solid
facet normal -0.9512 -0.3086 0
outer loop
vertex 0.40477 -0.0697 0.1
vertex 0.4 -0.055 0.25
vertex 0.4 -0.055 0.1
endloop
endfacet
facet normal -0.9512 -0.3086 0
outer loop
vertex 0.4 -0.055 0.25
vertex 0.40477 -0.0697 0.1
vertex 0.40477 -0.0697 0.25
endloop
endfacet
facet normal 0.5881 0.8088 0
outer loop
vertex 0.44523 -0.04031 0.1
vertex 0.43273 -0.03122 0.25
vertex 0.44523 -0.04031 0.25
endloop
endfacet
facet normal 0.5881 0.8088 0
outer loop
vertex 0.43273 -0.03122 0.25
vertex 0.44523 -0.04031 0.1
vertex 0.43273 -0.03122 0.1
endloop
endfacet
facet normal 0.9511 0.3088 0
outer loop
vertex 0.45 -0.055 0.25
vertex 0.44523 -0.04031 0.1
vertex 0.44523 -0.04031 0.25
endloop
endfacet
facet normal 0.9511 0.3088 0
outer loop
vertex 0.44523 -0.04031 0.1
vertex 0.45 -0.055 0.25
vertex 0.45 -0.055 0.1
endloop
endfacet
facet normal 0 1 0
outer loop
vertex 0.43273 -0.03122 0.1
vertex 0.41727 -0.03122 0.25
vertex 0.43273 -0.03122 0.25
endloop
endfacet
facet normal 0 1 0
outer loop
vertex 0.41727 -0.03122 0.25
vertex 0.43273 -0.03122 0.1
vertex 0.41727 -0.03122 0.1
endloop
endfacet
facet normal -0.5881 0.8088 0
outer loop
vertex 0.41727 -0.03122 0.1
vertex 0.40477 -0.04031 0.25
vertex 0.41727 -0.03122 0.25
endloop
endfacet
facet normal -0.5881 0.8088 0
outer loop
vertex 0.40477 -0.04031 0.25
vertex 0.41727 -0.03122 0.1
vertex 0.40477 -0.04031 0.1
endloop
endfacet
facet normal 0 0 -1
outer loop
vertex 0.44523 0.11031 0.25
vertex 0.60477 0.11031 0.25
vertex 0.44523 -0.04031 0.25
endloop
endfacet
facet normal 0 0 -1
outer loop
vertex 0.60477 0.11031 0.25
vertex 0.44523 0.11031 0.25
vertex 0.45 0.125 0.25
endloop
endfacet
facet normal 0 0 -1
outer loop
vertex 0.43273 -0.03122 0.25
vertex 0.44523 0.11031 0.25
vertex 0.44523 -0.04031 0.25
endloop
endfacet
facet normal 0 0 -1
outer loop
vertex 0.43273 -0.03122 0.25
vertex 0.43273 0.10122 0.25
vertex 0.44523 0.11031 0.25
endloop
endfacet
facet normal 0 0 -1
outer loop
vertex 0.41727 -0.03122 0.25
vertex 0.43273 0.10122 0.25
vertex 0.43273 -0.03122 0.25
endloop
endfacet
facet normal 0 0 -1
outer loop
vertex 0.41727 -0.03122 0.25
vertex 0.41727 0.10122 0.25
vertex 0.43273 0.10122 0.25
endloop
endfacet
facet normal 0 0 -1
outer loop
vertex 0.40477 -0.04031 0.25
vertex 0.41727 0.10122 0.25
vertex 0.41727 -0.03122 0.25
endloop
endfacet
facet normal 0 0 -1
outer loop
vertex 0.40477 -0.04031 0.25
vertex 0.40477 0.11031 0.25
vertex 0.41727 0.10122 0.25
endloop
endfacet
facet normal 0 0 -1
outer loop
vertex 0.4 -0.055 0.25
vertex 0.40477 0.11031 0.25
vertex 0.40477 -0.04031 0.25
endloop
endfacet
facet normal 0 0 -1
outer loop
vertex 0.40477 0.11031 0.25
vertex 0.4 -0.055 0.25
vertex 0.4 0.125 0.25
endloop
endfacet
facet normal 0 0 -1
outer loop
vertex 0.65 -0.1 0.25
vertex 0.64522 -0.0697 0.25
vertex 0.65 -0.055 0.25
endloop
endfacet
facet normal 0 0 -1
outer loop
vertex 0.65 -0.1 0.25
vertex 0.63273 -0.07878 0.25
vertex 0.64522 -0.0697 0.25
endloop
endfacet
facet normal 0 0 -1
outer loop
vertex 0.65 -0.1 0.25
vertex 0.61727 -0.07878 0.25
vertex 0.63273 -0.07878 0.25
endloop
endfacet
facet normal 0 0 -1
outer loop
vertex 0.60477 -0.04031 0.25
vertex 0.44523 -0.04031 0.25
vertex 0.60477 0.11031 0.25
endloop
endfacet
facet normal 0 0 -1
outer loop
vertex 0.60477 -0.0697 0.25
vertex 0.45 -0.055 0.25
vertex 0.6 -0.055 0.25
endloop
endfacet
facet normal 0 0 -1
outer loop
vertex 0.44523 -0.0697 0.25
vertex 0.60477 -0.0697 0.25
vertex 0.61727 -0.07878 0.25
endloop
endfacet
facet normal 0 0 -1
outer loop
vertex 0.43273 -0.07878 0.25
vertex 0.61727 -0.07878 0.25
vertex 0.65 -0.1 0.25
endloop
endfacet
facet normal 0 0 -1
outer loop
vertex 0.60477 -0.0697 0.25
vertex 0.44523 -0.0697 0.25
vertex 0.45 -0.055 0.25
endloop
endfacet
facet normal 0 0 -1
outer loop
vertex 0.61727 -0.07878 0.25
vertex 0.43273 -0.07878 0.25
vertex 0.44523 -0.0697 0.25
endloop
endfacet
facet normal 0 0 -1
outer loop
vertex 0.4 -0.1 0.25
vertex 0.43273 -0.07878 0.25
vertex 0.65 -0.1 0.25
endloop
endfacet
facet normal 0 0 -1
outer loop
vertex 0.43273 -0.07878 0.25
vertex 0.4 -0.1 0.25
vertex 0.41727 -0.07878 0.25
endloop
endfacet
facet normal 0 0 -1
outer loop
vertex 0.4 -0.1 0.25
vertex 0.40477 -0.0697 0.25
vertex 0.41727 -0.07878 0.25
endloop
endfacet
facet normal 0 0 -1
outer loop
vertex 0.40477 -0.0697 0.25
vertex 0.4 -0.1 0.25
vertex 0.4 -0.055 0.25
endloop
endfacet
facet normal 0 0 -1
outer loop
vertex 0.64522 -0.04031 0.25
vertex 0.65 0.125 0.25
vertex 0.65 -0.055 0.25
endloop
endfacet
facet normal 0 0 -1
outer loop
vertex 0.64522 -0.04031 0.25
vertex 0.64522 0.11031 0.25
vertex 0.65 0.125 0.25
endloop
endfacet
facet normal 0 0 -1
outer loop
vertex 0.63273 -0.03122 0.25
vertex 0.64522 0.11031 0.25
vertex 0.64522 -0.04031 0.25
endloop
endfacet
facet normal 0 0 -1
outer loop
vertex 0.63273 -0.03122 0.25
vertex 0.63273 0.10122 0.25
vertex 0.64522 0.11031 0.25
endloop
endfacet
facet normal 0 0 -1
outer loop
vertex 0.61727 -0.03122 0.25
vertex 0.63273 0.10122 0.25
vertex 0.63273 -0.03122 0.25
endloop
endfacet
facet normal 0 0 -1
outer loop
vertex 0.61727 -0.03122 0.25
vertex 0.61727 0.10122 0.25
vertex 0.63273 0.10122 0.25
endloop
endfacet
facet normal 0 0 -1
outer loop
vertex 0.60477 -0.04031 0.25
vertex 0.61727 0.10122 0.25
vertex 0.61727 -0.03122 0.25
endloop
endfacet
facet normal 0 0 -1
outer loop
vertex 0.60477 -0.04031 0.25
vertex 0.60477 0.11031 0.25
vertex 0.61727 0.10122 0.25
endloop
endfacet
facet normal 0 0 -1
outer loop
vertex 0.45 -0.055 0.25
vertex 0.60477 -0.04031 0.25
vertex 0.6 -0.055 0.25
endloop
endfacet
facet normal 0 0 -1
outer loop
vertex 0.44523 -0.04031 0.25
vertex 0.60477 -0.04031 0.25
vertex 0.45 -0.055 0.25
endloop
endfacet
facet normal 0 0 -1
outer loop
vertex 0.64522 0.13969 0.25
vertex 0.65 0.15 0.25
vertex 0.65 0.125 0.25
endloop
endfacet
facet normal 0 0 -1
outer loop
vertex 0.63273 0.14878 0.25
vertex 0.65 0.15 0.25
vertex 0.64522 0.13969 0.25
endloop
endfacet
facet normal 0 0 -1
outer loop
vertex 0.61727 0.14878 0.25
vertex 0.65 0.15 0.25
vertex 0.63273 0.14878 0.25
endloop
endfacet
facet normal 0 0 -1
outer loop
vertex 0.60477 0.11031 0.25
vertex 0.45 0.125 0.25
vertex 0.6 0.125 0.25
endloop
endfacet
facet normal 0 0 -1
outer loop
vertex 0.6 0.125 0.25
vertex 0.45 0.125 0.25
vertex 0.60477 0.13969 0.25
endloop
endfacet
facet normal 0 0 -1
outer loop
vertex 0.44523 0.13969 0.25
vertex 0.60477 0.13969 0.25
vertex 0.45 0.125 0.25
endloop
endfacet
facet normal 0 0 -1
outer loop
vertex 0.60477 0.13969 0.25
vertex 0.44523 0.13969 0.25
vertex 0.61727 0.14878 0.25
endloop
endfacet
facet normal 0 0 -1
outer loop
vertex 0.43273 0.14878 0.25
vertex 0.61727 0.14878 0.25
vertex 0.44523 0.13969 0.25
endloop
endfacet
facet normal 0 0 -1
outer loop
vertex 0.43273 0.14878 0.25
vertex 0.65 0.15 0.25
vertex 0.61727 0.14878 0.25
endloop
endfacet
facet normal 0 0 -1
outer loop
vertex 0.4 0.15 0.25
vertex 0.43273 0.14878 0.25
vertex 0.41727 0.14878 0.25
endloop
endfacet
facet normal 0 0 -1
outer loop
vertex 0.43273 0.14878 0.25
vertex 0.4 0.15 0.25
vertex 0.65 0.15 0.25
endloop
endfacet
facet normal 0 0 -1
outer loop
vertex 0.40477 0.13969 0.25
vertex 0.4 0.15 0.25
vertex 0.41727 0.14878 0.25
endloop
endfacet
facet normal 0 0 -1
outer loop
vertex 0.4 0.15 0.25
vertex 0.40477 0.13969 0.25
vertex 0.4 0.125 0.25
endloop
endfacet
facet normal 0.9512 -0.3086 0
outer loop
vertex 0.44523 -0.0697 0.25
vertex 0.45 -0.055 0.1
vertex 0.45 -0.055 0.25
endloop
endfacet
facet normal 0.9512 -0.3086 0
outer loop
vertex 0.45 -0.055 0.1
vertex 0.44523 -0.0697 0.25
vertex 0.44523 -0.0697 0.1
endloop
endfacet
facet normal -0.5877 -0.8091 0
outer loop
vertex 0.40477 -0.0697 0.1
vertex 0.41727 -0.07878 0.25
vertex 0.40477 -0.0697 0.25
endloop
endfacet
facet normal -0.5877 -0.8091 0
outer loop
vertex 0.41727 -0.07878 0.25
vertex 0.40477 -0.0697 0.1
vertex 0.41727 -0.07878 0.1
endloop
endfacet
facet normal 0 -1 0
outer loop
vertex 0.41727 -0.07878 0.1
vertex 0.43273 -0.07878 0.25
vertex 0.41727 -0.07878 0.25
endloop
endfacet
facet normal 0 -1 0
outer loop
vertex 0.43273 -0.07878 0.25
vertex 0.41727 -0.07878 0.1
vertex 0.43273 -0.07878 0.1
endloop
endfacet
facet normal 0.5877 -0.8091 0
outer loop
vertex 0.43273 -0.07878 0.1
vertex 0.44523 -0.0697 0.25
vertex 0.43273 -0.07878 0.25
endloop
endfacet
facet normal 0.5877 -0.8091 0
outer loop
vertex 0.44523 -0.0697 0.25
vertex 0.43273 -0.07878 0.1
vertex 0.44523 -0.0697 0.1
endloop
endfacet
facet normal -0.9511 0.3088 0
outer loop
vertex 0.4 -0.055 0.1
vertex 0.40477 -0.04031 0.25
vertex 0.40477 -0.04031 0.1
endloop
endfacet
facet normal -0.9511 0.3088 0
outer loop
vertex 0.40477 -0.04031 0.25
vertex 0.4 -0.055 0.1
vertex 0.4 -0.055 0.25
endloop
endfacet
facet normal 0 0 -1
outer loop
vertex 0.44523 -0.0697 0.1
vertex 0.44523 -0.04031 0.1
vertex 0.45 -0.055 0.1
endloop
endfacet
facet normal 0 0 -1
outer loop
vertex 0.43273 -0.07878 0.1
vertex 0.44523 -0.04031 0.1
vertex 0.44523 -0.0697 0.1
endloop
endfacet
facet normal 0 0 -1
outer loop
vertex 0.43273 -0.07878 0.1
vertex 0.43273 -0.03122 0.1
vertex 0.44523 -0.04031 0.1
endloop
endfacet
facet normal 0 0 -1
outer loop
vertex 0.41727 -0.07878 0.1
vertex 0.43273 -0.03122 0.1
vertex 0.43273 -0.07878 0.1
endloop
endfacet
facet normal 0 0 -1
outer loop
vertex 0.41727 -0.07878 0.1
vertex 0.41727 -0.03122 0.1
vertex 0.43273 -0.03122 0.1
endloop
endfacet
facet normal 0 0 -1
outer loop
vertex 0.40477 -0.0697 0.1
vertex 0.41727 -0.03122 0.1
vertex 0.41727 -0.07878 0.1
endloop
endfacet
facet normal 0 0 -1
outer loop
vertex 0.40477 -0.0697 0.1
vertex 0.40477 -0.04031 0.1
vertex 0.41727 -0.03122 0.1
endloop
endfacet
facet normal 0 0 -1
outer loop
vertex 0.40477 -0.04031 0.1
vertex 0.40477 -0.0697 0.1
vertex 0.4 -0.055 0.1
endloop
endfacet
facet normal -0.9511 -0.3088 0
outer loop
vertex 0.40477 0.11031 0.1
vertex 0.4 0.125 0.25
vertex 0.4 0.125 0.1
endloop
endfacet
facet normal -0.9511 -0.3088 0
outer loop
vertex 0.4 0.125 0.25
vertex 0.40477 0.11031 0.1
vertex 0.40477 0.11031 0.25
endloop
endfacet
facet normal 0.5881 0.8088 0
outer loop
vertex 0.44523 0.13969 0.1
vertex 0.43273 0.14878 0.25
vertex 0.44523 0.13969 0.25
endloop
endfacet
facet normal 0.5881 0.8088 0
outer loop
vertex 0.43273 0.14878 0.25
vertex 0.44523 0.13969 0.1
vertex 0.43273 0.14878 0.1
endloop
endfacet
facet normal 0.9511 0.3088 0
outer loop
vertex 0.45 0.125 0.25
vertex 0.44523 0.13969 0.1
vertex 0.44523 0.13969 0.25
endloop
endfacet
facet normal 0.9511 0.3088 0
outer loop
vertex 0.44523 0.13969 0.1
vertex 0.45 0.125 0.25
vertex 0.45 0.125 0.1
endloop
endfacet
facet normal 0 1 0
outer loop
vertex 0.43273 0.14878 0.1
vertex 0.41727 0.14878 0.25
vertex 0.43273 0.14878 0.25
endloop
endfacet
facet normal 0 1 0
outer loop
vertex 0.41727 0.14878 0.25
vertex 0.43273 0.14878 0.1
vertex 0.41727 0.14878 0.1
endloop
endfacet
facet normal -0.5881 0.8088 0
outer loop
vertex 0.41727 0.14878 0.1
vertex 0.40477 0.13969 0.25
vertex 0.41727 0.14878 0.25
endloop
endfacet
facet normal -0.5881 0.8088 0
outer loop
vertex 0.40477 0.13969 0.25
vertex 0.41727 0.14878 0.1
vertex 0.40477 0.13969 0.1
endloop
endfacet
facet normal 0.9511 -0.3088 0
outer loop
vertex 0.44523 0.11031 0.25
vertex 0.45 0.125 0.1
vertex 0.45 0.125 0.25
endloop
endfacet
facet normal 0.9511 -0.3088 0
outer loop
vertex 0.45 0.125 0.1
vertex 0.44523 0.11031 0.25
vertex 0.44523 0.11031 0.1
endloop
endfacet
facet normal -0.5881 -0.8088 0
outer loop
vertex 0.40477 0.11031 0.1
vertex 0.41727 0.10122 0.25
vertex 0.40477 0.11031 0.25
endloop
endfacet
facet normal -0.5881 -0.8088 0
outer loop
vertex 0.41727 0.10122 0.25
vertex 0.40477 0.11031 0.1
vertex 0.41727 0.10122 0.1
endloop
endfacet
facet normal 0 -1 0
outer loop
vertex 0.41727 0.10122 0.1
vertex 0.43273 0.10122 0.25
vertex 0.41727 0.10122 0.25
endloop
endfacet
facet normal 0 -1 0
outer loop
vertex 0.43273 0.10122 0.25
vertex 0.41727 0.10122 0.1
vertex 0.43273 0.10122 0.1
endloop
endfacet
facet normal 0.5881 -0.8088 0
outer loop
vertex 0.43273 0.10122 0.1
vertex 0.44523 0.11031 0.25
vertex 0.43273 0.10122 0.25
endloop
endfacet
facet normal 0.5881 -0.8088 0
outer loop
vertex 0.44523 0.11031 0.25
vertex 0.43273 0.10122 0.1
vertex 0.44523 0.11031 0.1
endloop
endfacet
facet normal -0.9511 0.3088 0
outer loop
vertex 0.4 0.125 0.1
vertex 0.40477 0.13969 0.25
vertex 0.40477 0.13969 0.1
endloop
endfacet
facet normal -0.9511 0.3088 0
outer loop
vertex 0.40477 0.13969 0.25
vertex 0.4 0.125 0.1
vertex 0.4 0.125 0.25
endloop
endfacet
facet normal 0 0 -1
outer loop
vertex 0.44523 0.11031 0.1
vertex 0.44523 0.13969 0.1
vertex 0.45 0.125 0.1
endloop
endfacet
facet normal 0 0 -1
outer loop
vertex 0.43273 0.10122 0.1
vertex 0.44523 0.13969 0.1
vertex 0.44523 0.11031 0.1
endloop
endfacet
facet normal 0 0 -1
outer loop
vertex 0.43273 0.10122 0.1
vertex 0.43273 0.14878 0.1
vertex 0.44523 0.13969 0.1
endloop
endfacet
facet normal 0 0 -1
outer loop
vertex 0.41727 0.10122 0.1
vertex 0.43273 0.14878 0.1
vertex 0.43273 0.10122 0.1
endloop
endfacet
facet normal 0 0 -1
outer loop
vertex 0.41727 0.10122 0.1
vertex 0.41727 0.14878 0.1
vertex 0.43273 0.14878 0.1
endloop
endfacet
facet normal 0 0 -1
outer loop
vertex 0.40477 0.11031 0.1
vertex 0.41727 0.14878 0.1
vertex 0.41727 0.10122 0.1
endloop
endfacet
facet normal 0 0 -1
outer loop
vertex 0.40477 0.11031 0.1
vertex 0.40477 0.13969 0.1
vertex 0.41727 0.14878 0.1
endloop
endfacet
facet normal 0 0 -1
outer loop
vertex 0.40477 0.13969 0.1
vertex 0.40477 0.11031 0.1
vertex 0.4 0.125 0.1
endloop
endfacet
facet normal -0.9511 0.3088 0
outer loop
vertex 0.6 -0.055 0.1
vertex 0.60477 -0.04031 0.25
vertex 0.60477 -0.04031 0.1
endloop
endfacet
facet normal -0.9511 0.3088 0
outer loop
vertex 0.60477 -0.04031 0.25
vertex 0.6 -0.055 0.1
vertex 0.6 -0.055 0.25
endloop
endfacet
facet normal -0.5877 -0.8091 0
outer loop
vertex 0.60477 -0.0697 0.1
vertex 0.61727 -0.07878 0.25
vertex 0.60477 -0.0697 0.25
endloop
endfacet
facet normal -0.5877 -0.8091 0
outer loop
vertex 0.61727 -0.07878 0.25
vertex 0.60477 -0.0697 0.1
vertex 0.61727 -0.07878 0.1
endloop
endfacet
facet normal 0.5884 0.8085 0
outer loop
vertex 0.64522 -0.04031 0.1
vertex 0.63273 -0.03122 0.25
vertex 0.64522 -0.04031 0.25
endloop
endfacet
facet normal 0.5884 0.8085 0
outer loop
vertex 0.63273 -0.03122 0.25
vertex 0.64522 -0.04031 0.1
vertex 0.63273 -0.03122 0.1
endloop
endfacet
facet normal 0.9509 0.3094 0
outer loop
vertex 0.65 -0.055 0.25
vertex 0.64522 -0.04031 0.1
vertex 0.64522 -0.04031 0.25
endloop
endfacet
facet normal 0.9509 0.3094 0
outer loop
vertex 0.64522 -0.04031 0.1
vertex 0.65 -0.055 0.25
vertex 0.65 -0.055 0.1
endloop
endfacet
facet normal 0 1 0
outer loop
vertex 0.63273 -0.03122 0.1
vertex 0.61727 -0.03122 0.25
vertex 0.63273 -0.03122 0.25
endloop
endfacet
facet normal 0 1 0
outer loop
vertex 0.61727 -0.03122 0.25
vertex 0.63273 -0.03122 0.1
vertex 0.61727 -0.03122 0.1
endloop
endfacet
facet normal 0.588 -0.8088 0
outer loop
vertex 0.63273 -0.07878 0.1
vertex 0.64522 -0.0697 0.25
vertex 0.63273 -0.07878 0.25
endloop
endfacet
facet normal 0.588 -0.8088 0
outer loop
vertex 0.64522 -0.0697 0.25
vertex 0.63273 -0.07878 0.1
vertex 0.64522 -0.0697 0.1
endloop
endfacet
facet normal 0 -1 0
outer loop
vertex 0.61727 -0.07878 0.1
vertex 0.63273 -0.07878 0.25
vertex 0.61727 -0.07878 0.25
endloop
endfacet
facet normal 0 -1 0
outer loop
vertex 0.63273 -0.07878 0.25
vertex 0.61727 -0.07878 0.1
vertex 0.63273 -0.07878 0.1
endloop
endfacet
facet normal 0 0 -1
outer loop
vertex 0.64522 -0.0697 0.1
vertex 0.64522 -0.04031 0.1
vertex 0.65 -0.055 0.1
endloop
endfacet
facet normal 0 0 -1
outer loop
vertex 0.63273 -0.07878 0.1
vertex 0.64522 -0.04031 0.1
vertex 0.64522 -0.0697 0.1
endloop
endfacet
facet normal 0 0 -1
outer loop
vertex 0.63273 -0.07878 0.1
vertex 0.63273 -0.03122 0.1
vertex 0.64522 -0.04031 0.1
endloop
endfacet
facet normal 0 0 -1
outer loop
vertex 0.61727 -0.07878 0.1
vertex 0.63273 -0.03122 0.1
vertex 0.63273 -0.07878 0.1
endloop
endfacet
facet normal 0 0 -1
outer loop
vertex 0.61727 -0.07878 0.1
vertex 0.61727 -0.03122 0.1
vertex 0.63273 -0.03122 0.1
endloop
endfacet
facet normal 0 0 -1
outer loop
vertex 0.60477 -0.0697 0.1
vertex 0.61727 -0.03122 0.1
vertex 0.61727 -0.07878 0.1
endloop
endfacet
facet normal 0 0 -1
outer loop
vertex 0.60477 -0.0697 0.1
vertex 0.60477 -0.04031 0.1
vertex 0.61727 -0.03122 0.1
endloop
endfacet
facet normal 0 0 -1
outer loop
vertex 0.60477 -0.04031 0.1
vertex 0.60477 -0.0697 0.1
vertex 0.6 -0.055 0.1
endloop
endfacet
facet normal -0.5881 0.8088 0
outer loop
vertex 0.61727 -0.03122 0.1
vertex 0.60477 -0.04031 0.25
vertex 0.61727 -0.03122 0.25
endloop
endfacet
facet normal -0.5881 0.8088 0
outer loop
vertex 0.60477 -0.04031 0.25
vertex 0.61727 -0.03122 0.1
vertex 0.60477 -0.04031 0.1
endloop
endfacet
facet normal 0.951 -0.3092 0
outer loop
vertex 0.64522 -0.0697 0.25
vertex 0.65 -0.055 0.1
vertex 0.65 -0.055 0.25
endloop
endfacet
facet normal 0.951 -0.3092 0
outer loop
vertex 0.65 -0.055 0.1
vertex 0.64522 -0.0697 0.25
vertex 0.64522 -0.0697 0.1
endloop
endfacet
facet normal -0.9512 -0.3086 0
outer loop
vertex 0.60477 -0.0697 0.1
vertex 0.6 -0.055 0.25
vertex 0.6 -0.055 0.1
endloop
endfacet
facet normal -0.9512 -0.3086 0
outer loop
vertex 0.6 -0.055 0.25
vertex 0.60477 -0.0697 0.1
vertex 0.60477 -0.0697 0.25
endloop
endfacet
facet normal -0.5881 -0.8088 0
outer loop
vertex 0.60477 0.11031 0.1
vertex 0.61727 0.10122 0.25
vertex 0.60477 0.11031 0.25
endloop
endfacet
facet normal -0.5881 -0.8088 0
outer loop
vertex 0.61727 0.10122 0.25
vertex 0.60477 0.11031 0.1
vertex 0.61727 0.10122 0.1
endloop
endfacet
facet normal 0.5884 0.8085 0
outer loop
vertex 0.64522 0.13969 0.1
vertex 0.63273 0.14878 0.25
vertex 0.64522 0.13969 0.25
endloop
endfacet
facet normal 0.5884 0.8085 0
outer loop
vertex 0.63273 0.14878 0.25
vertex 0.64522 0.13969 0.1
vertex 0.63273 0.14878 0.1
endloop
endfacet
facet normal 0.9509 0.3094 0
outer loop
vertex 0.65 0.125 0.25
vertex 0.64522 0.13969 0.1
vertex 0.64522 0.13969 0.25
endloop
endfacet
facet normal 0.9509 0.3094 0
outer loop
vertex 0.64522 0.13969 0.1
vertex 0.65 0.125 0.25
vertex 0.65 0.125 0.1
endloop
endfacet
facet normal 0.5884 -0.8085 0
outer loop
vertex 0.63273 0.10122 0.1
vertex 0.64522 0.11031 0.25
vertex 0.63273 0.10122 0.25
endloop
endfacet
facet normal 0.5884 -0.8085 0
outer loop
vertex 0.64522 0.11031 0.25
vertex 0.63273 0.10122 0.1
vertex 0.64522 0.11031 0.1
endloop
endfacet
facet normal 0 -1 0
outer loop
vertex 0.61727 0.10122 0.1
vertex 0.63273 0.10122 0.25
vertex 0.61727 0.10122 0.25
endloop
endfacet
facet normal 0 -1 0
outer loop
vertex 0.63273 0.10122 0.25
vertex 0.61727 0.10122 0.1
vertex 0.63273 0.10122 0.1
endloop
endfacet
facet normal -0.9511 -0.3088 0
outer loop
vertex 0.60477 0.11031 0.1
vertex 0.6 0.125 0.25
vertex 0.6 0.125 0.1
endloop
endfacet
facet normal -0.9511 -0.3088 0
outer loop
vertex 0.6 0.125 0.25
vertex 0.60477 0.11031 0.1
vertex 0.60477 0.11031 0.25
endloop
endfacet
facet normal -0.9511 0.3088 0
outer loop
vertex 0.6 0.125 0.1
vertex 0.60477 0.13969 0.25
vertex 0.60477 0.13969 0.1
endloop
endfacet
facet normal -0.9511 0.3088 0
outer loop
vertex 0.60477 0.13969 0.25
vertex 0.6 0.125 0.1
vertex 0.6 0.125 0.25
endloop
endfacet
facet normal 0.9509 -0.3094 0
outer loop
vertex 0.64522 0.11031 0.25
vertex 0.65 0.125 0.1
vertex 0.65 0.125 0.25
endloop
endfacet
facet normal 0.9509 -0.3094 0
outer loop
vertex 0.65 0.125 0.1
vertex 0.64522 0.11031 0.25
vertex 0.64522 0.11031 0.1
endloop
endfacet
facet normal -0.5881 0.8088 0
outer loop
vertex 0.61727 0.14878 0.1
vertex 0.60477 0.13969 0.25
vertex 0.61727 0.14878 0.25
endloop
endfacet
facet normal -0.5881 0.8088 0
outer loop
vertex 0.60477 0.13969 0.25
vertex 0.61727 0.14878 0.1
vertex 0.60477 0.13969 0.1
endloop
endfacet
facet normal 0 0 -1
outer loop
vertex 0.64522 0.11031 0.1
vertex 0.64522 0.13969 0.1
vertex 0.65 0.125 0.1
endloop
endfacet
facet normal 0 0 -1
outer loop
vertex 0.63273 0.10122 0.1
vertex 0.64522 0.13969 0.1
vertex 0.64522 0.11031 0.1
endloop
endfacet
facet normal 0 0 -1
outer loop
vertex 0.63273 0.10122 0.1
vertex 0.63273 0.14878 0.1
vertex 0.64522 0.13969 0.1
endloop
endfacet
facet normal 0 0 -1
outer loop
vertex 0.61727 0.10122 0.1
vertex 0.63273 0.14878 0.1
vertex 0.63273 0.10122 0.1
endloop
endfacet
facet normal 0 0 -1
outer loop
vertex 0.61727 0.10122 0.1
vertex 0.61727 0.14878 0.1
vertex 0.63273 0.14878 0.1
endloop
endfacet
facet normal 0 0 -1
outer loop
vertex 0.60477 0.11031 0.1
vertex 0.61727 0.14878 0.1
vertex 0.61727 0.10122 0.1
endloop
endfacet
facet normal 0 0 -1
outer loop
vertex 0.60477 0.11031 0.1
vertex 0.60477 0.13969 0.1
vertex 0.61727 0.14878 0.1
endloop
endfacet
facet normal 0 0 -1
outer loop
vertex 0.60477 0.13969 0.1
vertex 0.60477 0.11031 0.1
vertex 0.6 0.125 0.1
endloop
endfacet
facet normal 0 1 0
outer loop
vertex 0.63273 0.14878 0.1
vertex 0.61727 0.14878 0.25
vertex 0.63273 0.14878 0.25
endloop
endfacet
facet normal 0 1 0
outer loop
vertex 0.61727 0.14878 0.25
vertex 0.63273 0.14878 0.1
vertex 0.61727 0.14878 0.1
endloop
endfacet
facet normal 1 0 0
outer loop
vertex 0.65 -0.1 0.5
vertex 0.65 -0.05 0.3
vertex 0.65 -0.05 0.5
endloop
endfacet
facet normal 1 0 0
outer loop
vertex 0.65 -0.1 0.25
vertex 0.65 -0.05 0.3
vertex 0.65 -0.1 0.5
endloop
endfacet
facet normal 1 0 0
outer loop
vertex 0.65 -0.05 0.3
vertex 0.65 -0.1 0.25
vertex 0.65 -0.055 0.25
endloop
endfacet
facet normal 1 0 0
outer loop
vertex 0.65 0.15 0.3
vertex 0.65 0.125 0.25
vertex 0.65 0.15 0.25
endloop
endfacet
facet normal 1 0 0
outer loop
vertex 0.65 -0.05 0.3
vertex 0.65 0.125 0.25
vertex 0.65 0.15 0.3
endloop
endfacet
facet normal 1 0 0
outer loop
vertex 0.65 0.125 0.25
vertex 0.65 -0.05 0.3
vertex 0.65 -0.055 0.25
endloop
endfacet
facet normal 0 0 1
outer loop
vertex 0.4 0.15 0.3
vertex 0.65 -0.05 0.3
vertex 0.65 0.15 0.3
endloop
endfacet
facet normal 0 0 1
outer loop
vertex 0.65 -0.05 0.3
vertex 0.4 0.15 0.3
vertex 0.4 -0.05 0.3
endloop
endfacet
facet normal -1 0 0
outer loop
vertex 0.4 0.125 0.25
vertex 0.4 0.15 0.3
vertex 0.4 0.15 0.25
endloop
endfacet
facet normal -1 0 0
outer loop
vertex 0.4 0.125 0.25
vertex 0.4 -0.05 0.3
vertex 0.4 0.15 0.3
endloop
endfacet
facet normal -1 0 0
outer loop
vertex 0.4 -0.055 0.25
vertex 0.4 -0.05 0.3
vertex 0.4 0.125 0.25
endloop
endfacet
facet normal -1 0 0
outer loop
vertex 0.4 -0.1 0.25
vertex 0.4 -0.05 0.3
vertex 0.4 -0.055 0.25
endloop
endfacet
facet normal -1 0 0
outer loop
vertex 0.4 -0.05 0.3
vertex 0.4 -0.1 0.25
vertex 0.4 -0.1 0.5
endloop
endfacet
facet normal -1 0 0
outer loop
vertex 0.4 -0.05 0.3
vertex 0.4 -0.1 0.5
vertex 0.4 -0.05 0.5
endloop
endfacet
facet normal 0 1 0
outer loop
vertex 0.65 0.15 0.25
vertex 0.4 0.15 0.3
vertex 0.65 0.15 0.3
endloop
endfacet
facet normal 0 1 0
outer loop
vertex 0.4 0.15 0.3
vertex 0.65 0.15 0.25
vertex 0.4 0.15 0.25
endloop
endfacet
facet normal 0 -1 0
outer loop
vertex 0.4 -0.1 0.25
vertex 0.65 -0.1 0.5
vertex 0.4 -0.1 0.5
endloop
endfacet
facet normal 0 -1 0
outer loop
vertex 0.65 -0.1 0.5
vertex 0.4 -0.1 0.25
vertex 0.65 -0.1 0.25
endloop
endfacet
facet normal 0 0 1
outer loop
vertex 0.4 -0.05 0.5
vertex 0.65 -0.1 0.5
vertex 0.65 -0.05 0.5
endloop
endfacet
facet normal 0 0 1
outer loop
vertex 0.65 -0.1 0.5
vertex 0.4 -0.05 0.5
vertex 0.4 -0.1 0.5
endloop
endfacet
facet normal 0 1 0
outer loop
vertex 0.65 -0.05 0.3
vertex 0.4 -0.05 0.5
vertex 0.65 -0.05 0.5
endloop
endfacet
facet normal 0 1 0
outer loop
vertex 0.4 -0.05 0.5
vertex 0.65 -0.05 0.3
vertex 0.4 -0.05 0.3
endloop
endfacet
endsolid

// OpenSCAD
translate([0.4, -.1, 0.25]) {
 
    // Seat
    cube([0.25, 0.25, .05]);

    // Backrest
    cube([0.25, 0.05, 0.25]);

    // Legs
    for(x=[0.025, 0.225])
    for(y=[0.045, 0.225])
    translate([x, y, -0.15])
    cylinder(0.15, r=0.025, $fn=10);
}
